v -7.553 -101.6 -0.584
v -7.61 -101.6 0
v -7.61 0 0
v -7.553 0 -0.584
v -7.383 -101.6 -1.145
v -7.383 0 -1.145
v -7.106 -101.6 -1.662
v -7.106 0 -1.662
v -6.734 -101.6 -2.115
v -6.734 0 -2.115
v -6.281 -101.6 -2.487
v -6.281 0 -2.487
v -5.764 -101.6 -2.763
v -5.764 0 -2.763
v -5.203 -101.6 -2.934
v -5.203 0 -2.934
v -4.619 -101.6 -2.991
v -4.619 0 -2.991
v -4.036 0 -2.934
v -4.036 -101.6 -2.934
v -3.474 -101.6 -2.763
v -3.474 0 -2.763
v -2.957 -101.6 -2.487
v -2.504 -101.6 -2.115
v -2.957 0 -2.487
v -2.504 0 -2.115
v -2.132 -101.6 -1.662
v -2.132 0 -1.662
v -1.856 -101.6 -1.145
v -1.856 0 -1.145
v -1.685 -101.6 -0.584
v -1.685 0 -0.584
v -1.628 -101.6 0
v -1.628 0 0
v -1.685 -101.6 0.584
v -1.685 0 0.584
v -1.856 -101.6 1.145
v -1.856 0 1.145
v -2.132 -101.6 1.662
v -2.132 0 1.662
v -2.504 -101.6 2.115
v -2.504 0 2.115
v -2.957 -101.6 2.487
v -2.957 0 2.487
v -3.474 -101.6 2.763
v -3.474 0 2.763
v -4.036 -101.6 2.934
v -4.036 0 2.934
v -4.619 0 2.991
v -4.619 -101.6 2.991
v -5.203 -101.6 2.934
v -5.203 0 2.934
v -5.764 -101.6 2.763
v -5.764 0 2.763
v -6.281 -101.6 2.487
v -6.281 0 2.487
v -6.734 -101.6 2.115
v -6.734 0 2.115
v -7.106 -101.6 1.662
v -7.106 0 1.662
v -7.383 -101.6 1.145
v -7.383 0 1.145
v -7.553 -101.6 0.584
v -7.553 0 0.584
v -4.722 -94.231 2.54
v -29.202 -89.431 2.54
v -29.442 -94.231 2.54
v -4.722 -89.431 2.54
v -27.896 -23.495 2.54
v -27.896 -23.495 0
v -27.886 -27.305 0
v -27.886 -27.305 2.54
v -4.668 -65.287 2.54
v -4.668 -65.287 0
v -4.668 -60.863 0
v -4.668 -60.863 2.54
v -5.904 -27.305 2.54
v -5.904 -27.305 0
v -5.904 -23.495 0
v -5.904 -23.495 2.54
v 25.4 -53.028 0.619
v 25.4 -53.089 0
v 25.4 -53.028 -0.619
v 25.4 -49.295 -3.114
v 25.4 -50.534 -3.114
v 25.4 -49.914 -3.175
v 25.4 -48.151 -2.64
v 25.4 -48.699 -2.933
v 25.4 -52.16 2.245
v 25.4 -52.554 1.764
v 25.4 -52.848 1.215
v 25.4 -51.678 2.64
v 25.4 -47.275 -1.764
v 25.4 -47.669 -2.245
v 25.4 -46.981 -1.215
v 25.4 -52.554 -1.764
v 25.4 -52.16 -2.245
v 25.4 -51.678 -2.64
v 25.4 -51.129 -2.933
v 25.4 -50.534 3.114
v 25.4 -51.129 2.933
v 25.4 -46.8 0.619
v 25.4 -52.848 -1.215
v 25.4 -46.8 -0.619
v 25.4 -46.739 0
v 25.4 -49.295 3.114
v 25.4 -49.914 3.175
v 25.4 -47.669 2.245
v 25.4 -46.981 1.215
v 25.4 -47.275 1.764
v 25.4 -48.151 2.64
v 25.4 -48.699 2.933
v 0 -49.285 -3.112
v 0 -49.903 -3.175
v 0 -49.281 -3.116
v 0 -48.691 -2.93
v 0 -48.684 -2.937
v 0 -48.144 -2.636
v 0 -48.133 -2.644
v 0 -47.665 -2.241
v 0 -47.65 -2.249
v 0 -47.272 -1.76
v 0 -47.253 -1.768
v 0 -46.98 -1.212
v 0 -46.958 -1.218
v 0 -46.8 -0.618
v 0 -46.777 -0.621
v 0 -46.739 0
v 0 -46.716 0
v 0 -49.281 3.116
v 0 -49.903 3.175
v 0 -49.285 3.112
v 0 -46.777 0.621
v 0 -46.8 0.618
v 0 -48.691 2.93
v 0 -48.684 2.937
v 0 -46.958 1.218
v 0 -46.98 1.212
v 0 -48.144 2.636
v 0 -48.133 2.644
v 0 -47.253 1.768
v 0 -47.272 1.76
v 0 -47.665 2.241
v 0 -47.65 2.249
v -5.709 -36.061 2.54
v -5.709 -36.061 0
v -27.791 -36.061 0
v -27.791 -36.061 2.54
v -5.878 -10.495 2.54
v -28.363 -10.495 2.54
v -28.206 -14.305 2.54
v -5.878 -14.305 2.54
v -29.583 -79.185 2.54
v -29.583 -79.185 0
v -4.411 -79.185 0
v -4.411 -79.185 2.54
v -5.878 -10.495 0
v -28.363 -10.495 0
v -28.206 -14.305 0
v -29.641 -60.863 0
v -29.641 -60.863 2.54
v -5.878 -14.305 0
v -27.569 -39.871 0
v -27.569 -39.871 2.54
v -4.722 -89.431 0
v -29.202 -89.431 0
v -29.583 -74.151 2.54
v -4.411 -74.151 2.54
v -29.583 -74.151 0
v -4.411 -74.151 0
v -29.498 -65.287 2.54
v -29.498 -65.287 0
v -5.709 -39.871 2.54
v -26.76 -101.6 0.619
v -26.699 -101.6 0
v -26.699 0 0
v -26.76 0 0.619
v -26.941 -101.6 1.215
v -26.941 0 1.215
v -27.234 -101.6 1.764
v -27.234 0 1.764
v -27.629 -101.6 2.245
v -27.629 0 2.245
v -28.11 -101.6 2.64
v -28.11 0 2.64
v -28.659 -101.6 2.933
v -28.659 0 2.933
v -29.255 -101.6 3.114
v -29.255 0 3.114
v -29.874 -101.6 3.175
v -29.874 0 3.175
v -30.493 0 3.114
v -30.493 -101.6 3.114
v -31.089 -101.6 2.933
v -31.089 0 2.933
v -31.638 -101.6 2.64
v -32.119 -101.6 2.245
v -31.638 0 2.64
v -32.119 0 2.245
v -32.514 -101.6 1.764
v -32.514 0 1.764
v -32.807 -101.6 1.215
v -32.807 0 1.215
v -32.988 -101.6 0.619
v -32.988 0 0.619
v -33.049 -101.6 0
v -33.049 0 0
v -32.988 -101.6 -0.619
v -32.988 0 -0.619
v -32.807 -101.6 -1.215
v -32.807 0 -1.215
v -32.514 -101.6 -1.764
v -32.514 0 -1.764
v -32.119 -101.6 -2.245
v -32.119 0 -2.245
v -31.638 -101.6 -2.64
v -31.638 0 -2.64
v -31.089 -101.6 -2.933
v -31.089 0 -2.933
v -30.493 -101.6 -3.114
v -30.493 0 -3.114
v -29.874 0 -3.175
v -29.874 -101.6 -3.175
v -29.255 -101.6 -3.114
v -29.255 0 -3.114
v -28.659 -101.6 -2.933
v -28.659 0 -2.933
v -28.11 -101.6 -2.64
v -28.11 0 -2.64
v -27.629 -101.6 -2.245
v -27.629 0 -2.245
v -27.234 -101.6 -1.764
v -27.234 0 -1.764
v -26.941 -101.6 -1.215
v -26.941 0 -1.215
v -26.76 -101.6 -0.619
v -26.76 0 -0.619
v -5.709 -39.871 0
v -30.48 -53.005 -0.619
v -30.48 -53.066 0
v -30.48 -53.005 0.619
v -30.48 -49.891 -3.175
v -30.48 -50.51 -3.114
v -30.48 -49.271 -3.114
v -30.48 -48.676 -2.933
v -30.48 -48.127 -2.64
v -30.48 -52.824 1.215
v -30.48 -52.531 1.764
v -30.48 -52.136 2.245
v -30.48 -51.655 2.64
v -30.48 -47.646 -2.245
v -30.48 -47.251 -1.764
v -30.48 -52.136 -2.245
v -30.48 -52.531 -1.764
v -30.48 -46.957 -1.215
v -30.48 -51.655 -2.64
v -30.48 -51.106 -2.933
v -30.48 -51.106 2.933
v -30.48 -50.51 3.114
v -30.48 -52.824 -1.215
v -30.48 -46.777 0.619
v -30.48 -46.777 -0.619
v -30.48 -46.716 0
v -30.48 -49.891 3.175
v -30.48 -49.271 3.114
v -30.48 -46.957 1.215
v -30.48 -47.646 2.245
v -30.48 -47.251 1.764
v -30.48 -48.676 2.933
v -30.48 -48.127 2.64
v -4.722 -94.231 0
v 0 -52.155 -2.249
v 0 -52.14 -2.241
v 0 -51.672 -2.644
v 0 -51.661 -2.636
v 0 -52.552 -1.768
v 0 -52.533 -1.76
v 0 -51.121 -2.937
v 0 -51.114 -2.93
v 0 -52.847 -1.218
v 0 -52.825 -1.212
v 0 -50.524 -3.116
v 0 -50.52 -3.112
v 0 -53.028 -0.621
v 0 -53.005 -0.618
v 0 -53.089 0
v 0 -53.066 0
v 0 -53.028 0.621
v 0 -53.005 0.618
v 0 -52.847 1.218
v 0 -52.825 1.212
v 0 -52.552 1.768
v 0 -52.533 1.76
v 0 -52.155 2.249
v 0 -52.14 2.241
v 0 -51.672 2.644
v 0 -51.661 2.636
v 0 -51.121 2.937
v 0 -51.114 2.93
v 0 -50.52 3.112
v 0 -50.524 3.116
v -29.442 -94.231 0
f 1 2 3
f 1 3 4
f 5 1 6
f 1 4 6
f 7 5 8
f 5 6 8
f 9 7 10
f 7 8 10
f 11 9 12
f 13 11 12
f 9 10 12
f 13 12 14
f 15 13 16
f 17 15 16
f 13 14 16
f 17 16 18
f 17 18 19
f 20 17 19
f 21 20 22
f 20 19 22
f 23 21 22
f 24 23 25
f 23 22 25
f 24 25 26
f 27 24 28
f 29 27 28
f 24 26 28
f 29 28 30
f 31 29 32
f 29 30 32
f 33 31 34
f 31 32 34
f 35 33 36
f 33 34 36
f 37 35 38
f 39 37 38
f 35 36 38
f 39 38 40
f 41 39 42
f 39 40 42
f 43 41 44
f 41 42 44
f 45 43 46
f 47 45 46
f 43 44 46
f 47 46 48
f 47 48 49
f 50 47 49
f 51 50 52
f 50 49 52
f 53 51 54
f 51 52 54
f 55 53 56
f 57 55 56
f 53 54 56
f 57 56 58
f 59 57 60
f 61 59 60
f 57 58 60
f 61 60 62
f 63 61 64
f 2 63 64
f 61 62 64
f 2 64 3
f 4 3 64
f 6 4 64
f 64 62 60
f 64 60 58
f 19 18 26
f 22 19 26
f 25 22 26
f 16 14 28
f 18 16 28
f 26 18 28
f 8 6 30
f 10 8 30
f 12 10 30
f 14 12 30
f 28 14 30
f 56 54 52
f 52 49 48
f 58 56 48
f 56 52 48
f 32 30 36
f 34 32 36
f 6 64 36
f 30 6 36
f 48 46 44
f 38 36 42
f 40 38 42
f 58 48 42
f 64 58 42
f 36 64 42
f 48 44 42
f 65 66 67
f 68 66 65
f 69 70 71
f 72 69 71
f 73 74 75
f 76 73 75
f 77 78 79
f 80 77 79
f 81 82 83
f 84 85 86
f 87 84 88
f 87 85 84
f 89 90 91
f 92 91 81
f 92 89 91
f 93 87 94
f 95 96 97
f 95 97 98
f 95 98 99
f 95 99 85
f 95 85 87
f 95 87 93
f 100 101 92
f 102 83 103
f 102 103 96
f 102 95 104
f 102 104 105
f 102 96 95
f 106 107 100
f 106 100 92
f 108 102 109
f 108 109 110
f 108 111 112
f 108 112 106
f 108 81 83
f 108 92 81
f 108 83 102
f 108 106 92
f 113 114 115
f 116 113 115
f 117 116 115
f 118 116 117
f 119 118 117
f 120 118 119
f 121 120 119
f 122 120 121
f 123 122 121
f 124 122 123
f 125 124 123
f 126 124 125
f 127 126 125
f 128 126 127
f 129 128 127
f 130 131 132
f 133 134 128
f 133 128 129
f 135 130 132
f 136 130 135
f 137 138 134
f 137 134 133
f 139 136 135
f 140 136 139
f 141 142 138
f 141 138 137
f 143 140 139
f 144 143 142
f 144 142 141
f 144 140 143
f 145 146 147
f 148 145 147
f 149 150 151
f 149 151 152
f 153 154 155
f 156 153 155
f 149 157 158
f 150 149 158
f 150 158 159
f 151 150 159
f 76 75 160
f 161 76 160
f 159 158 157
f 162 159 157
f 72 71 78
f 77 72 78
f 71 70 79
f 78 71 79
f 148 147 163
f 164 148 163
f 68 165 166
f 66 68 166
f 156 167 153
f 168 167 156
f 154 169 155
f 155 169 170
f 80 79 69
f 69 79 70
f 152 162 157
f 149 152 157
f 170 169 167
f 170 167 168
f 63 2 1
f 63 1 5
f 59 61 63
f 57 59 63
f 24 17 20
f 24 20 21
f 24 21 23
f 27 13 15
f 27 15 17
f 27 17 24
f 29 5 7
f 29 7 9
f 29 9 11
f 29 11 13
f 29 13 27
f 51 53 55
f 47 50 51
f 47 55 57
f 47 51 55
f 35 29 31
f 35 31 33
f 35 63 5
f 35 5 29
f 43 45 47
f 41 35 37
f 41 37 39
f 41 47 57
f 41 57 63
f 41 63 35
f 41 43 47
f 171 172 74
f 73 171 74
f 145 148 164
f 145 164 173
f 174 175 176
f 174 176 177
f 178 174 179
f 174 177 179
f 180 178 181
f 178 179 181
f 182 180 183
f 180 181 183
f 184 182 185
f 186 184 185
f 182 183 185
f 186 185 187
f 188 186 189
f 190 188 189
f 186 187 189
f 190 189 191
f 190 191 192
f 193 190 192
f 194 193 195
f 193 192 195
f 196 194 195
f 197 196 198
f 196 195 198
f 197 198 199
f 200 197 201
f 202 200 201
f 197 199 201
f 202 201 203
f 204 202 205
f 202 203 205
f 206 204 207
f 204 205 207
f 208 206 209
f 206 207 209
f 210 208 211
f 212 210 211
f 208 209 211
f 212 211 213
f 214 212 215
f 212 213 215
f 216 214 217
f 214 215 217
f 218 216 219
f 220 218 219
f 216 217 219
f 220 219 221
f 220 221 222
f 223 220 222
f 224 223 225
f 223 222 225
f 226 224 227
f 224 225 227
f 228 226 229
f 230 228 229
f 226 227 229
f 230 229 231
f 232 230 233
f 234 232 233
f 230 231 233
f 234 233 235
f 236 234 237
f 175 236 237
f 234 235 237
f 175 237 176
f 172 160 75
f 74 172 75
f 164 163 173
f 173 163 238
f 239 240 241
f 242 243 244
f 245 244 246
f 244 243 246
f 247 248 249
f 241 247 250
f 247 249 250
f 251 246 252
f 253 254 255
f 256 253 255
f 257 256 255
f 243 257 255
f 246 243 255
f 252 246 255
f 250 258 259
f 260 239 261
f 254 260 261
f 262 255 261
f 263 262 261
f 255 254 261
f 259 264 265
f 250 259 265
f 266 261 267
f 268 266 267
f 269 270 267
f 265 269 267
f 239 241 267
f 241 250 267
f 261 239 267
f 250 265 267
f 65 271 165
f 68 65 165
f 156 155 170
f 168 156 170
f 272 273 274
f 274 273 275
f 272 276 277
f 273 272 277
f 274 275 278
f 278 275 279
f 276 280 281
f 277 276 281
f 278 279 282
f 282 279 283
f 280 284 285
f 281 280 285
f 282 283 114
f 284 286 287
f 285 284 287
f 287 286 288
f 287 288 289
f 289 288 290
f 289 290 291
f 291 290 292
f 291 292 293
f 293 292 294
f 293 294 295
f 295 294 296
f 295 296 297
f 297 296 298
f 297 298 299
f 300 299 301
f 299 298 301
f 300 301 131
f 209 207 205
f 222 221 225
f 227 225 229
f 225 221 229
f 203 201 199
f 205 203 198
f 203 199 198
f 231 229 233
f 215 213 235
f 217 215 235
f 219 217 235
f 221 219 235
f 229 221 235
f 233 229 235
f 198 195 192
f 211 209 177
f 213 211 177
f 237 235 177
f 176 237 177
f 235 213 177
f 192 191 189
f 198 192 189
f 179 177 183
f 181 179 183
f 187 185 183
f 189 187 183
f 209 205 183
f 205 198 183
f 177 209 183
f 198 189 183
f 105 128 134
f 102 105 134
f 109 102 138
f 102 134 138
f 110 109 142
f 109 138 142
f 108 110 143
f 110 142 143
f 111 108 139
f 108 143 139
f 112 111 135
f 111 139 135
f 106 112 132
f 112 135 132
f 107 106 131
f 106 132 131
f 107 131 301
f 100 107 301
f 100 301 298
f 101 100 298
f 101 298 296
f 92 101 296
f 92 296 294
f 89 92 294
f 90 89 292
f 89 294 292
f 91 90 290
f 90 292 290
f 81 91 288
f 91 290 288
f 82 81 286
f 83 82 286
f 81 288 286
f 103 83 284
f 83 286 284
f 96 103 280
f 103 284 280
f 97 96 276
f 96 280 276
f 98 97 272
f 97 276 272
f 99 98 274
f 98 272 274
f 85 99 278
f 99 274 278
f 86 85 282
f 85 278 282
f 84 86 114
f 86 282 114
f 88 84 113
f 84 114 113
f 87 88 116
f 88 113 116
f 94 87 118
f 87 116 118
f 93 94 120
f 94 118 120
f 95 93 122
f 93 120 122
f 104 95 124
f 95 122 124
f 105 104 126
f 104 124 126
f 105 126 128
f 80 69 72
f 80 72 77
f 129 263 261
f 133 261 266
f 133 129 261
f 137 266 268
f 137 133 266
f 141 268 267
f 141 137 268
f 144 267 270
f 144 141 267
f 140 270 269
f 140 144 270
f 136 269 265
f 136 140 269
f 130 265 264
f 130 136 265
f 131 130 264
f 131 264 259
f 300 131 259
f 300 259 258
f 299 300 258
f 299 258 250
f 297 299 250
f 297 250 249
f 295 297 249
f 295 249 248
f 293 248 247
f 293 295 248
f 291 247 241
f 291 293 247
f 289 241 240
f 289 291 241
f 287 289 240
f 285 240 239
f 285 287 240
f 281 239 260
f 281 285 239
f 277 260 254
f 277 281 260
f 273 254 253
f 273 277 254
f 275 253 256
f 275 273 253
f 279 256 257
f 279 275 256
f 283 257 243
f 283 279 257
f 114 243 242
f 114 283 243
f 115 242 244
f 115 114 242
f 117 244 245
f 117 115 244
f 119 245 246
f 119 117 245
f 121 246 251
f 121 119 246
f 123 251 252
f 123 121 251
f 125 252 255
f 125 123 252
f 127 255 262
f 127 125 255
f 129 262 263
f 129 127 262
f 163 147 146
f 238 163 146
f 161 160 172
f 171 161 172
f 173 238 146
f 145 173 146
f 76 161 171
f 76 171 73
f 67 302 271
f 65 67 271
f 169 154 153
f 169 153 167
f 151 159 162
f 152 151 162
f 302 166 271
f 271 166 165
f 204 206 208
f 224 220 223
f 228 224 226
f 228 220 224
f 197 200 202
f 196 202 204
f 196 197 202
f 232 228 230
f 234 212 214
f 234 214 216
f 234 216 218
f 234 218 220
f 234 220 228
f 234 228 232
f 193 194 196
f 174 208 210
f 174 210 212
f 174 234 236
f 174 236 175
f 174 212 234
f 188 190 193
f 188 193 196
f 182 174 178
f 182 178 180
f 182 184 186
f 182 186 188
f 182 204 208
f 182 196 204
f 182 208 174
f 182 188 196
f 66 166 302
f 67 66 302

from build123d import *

# Parameters (mm, degrees)
F1_DEPTH  = 101.6
F0_R      = 3.175
F3_DEPTH  = 2.54
F5_DEPTH  = 2.54
F7_DEPTH  = 2.54
F9_DEPTH  = 2.54
F10_W     = 25.1718442887
F10_H     = 5.0343647599
F11_DEPTH = 2.54
F13_DEPTH = 2.54
F14_R     = 3.175
F15_DEPTH = 25.4
F16_R     = 3.175
F17_DEPTH = 30.48


with BuildPart() as f1:
    # F0 (on Front) → F1 (new body)
    with BuildSketch(Plane.XZ):
        with BuildLine():
            ThreePointArc((-1.6279532905, 0), (-4.6191024041, 2.9911491136), (-7.6102515177, 0))
            ThreePointArc((-7.6102515177, 0), (-4.6191024041, -2.9911491136), (-1.6279532905, 0))
        make_face()
    extrude(amount=F1_DEPTH)


with BuildPart() as f1b:
    # F0 (on Front) → F1, piece 2 (new body)
    with BuildSketch(Plane.XZ):
        with Locations((-29.8739436954, 0)):
            Circle(F0_R)
    extrude(amount=F1_DEPTH)


with BuildPart() as f3:
    # F2 (on Top) → F3 (new body)
    with BuildSketch(Plane.XY):
        Polygon((-5.8781174012, -10.4949017987), (-28.3633093358, -10.4949017987), (-28.2058767051, -14.3049017987), (-5.8781174012, -14.3049017987), align=None)
    extrude(amount=F3_DEPTH)


with BuildPart() as f5:
    # F4 (on Top) → F5 (new body)
    with BuildSketch(Plane.XY):
        Polygon((-5.9038697944, -23.4945591775), (-27.895909807, -23.4945591775), (-27.8856036874, -27.3045591775), (-5.9038697944, -27.3045591775), align=None)
    extrude(amount=F5_DEPTH)


with BuildPart() as f7:
    # F6 (on Top) → F7 (new body)
    with BuildSketch(Plane.XY):
        Polygon((-5.7091666386, -36.060981127), (-27.7912820563, -36.060981127), (-27.5685340166, -39.870981127), (-5.7091666386, -39.870981127), align=None)
    extrude(amount=F7_DEPTH)


with BuildPart() as f9:
    # F8 (on Top) → F9 (new body)
    with BuildSketch(Plane.XY):
        Polygon((-4.6675032936, -60.8628503978), (-29.6411365271, -60.8628503978), (-29.498429969, -65.2867481112), (-4.6675032936, -65.2867481112), align=None)
    extrude(amount=F9_DEPTH)


with BuildPart() as f11:
    # F10 (on Top) → F11 (new body)
    with BuildSketch(Plane.XY):
        with Locations((-16.9968819246, -76.6682736576)):
            Rectangle(F10_W, F10_H)
    extrude(amount=F11_DEPTH)


with BuildPart() as f13:
    # F12 (on Top) → F13 (new body)
    with BuildSketch(Plane.XY):
        Polygon((-4.7217323445, -89.4306227565), (-29.2020086199, -89.4306227565), (-29.4420104474, -94.2306667566), (-4.7217323445, -94.2306667566), align=None)
    extrude(amount=F13_DEPTH)


with BuildPart() as f15:
    # F14 (on Right) → F15 (new body)
    with BuildSketch(Plane.YZ):
        with Locations((-49.9144792557, 0)):
            Circle(F14_R)
    extrude(amount=F15_DEPTH)

    # F16 (on Right) → F17 (join)
    with BuildSketch(Plane.YZ):
        with Locations((-49.8905852437, 0)):
            Circle(F16_R)
    extrude(amount=-F17_DEPTH)


solid = Compound([f1.part, f1b.part, f3.part, f5.part, f7.part, f9.part, f11.part, f13.part, f15.part])
